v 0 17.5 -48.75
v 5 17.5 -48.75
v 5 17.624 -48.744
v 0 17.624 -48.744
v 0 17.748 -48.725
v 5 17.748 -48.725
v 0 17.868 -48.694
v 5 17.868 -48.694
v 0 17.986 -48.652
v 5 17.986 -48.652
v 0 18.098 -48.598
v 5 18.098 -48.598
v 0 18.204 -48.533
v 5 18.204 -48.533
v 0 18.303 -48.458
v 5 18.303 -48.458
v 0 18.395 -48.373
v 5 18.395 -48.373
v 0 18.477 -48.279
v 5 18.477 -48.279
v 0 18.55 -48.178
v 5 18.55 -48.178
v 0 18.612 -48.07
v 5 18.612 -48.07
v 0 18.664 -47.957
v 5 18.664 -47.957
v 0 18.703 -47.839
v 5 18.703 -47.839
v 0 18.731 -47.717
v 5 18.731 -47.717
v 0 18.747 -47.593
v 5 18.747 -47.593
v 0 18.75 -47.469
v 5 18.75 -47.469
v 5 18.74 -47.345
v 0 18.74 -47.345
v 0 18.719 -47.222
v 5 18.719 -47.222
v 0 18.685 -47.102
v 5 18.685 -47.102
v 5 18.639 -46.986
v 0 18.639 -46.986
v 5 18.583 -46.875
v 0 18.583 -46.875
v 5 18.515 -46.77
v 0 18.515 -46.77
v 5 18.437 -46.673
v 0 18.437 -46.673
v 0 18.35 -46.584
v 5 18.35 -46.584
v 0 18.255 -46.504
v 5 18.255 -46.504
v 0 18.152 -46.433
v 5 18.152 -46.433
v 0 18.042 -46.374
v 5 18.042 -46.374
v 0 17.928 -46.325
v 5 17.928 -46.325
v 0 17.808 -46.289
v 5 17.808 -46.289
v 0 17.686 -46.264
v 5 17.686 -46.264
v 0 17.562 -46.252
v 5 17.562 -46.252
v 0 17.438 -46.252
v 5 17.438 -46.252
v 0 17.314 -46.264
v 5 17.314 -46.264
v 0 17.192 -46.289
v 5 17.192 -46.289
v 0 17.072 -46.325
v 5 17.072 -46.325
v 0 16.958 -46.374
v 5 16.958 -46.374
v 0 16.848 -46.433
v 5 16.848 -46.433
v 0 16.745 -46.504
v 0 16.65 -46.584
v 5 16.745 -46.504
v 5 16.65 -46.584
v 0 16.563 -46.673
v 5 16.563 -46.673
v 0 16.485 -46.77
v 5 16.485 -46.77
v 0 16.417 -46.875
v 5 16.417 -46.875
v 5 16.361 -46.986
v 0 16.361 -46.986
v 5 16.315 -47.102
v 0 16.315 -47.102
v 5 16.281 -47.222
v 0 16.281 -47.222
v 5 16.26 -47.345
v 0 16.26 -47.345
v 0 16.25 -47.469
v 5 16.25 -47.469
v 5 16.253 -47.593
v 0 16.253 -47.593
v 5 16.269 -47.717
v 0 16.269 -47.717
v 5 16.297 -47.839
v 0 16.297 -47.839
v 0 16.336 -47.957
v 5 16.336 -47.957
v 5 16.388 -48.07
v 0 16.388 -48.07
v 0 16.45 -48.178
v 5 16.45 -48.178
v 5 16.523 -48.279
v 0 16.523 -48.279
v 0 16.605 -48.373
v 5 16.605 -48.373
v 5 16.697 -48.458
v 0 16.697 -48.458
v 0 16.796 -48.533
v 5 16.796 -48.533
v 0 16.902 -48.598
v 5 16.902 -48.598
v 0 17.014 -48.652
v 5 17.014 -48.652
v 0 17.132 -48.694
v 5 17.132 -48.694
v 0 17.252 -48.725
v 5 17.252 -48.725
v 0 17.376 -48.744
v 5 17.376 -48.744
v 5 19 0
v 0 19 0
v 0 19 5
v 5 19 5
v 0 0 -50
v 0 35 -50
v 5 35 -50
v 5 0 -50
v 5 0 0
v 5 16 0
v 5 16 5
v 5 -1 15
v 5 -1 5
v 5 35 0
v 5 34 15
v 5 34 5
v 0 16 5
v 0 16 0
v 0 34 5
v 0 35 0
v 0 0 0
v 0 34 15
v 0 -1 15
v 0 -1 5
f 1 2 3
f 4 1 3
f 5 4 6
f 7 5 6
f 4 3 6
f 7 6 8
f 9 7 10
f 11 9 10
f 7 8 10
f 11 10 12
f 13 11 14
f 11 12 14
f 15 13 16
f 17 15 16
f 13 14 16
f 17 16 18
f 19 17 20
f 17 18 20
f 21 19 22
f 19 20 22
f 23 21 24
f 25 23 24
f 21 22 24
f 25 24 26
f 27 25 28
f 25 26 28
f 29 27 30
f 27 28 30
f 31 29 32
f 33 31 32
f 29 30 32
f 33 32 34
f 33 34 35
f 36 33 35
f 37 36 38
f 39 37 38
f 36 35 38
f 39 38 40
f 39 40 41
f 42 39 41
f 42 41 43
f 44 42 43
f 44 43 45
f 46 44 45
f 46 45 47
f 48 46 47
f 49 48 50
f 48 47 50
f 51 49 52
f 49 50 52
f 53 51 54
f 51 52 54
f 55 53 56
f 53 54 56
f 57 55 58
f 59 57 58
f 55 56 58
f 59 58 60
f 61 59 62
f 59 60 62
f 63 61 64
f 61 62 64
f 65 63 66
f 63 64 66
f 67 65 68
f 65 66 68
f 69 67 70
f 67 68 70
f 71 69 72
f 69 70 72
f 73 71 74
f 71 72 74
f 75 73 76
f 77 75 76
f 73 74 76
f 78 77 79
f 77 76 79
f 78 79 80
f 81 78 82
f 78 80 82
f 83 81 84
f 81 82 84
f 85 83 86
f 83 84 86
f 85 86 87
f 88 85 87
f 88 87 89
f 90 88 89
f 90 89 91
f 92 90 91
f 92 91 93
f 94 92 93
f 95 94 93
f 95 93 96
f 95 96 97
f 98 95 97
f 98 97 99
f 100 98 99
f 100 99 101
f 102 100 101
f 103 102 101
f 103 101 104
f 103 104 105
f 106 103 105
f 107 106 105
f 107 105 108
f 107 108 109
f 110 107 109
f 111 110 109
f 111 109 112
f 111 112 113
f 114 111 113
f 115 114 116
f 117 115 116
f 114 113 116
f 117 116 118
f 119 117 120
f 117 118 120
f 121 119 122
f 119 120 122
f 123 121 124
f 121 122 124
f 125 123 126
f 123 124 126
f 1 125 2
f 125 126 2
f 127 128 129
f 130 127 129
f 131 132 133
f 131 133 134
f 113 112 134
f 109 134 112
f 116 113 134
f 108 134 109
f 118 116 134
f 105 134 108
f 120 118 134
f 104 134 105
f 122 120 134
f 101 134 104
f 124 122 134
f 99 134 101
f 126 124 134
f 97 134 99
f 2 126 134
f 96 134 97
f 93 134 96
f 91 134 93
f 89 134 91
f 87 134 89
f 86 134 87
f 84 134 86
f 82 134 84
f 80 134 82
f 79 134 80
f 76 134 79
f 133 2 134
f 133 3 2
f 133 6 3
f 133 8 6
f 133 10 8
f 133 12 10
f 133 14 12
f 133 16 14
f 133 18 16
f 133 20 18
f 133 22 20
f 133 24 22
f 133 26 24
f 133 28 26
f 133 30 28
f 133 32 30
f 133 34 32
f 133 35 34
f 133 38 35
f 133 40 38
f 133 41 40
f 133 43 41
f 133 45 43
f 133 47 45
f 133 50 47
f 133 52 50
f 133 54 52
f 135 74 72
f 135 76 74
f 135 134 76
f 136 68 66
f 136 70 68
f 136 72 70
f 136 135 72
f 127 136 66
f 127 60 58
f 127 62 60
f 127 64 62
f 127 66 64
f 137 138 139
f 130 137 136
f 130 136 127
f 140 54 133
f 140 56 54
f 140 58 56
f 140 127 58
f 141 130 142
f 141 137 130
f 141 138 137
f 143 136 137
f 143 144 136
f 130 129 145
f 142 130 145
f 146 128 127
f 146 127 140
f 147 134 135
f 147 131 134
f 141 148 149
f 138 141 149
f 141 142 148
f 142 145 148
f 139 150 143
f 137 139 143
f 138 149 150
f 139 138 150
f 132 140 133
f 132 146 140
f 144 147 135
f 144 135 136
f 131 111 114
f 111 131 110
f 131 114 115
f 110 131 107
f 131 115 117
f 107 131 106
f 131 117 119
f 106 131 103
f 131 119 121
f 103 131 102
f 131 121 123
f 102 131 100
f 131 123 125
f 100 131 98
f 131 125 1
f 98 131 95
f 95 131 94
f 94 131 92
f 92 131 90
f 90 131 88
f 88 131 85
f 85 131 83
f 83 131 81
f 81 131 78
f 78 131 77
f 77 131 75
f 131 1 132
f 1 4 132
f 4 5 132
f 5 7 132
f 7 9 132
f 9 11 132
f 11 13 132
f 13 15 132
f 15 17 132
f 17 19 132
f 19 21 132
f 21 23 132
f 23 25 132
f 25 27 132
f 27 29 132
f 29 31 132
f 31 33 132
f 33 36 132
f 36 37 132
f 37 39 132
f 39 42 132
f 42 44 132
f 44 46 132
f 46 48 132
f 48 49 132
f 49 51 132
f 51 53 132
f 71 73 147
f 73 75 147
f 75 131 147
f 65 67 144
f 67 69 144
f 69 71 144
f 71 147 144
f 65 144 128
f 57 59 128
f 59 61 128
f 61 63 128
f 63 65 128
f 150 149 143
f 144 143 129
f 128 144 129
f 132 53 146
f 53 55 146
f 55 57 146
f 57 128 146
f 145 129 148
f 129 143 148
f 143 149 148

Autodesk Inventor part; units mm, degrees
ref_plane "YZ Plane" through (0, 0, 0) normal (1, 0, 0) x (0, 1, 0)
ref_plane "XZ Plane" through (0, 0, 0) normal (0, 1, 0) x (-1, 0, 0)
ref_plane "XY Plane" through (0, 0, 0) normal (0, 0, 1) x (1, 0, 0)
sketch "Sketch1" plane through (0, 0, 0) normal (1, 0, 0) x (0, 1, 0)
  line L0 (0, 0) -> (35, 0)
  line L1 (35, 0) -> (35, -50)
  line L2 (35, -50) -> (0, -50)
  line L3 (0, -50) -> (0, 0)
  line L4 (17.5, 0) -> (17.5, 11.9434)
  line L5 (19, 0) -> (19, 5)
  line L6 (16, 0) -> (16, 5)
  line L7 (-1, 5) -> (34, 5)
  line L8 (34, 5) -> (34, 15)
  line L9 (34, 15) -> (-1, 15)
  line L10 (-1, 15) -> (-1, 5)
  line L11 (16, 5) -> (19, 5)
  line L12 (19, 0) -> (16, 0)
  dimension "d0" = 35
  dimension "d1" = 50
  dimension "d2" = 5
  dimension "d3" = 1.5
  dimension "d4" = 1.5
  dimension "d11" = 10
  dimension "d12" = 0
extrude "Extrusion1" add sketch "Sketch1" along normal blind 5
sketch "Sketch3" plane through (5, 0, 0) normal (1, 0, 0) x (0, 0, -1)
  circle A0 centre (47.5, 17.5) radius 1.25
  line L0 (50, 0) -> (50, 35) projected
  line L1 (0, 0) -> (50, 0) projected
  dimension "d16" = 2.5
  dimension "d17" = 2.5
  dimension "d18" = 17.5
extrude "Extrusion3" cut sketch "Sketch3" against normal blind 5
equation "\"d3\" = 0.5 * Snap"
equation "\"d4\" = 0.5 * Snap"
equation "\"Snap\" = 3"
properties part number "Stresstest"
